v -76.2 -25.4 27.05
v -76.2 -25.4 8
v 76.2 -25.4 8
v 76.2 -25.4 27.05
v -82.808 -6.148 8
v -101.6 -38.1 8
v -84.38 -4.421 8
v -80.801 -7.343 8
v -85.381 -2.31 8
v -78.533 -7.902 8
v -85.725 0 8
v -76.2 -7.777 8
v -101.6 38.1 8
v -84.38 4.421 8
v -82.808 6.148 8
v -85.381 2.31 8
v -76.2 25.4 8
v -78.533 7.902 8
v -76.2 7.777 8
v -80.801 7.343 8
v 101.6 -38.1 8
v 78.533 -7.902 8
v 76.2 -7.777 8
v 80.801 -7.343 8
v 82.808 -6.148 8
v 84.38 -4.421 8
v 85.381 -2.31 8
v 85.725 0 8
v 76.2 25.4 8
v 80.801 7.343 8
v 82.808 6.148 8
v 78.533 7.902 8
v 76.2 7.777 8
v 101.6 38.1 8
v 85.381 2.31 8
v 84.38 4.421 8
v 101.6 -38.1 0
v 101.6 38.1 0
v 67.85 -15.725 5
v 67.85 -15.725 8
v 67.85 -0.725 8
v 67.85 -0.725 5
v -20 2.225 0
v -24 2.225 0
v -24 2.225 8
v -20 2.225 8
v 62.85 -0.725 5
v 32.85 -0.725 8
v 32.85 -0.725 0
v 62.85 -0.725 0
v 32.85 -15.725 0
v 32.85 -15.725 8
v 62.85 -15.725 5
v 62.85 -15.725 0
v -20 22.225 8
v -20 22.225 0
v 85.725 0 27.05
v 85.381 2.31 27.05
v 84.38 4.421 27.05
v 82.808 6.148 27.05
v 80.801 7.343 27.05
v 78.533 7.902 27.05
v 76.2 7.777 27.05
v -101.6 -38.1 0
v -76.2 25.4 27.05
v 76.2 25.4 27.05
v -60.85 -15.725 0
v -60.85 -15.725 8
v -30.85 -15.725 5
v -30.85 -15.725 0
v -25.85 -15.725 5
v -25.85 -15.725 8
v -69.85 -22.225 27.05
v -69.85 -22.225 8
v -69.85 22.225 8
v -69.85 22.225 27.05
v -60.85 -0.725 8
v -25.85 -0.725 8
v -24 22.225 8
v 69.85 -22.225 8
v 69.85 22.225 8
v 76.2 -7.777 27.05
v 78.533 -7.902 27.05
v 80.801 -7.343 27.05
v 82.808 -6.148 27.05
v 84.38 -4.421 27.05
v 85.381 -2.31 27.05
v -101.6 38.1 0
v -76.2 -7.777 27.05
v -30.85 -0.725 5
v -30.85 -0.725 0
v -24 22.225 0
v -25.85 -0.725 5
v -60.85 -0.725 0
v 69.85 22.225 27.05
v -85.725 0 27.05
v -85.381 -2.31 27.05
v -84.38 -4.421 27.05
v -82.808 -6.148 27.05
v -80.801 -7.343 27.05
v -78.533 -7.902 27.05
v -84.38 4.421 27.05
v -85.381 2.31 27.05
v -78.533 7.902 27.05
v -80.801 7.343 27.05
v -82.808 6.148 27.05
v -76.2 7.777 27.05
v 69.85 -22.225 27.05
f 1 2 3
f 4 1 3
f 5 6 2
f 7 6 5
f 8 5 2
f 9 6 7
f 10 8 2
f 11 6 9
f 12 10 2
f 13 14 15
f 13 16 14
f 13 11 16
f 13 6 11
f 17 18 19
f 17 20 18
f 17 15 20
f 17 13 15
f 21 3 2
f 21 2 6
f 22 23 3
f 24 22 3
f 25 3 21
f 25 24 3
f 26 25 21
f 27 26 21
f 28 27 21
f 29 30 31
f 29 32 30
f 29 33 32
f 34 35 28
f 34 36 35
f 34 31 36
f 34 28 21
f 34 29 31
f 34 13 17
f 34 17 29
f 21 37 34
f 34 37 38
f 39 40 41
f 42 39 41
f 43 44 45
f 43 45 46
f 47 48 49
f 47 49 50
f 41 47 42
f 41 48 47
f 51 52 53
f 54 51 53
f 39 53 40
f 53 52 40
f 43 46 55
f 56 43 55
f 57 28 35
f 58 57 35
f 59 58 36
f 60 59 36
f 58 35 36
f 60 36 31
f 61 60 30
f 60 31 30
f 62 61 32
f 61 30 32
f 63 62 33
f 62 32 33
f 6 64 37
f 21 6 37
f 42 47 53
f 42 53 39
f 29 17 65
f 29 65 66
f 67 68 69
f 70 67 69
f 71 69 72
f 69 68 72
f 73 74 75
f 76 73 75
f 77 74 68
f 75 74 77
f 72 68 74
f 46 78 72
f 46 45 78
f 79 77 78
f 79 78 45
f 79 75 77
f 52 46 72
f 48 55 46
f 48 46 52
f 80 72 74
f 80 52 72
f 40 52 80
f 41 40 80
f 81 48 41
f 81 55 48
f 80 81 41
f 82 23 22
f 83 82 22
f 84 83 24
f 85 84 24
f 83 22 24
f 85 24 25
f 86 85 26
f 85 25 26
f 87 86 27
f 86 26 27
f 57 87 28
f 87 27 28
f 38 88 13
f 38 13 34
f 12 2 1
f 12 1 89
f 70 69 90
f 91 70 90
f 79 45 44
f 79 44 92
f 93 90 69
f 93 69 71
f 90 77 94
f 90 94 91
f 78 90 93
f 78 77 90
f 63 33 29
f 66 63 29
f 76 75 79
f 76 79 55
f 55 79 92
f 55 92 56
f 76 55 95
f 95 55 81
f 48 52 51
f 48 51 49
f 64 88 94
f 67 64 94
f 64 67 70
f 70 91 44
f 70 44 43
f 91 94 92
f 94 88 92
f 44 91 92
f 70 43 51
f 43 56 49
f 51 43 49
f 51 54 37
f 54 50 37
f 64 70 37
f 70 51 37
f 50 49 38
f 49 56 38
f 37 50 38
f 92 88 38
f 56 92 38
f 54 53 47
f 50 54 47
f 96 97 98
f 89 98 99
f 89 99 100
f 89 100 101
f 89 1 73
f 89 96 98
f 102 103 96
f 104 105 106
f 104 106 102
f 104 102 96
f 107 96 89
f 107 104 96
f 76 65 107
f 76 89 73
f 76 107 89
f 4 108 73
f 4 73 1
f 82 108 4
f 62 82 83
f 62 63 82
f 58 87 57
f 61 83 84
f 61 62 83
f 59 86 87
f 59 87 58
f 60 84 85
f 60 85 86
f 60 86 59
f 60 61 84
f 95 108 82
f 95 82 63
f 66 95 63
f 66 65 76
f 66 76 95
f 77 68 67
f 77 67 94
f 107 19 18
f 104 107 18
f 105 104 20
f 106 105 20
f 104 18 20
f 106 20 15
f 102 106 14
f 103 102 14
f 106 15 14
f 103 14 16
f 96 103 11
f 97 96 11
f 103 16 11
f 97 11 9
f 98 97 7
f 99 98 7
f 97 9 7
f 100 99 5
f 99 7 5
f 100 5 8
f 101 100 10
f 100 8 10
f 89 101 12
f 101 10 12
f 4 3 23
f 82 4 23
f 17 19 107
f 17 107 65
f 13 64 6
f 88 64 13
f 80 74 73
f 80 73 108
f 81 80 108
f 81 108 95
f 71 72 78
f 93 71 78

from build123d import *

# Parameters (mm, degrees)
F0_W     = 203.2
F0_H     = 76.2
F1_DEPTH = 8
F2_W     = 152.4
F2_H     = 50.8
F2_W_2   = 139.7
F2_H_2   = 44.45
F4_DEPTH = 19.05
F5_W     = 30
F5_H     = 15
F6_DEPTH = 8
F5_W_2   = 4
F5_H_2   = 20
F7_DEPTH = 8
F8_W     = 5
F8_H     = 15
F9_DEPTH = 3


with BuildPart() as f1:
    # F0 (on Top) → F1 (new body)
    with BuildSketch(Plane.XY):
        Rectangle(F0_W, F0_H)
    extrude(amount=F1_DEPTH)

    # F2 (on face) + F3 (on face) → F4 (join)
    with BuildSketch(Plane.XY.offset(8)):
        Rectangle(F2_W, F2_H)
        Rectangle(F2_W_2, F2_H_2, mode=Mode.SUBTRACT)
    with BuildSketch(Plane.XY.offset(8)):
        with BuildLine():
            Line((-76.2, -7.7771299333), (-76.2, 7.7771299333))
            ThreePointArc((-76.2, 7.7771299333), (-85.725, 0), (-76.2, -7.7771299333))
        make_face()
        with BuildLine():
            ThreePointArc((85.725, 0), (82.8076157855, 6.1483610621), (76.2, 7.7771299333))
            Line((76.2, 7.7771299333), (76.2, -7.7771299333))
            ThreePointArc((76.2, -7.7771299333), (82.8076157855, -6.1483610621), (85.725, 0))
        make_face()
    extrude(amount=F4_DEPTH)

    # F5 (on face) → F6 (cut, through all)
    with BuildSketch(Plane.XY.offset(8)):
        with Locations((47.85, -8.225)):
            Rectangle(F5_W, F5_H)
        with Locations((-45.85, -8.225)):
            Rectangle(F5_W, F5_H)
    extrude(amount=-F6_DEPTH, mode=Mode.SUBTRACT)

    # F5 (on face) → F7 (cut, through all)
    with BuildSketch(Plane.XY.offset(8)):
        with Locations((-22, 12.225)):
            Rectangle(F5_W_2, F5_H_2)
    extrude(amount=-F7_DEPTH, mode=Mode.SUBTRACT)

    # F8 (on face) → F9 (cut)
    with BuildSketch(Plane.XY.offset(8)):
        with Locations((65.35, -8.225)):
            Rectangle(F8_W, F8_H)
        with Locations((-28.35, -8.225)):
            Rectangle(F8_W, F8_H)
    extrude(amount=-F9_DEPTH, mode=Mode.SUBTRACT)


solid = f1.part
